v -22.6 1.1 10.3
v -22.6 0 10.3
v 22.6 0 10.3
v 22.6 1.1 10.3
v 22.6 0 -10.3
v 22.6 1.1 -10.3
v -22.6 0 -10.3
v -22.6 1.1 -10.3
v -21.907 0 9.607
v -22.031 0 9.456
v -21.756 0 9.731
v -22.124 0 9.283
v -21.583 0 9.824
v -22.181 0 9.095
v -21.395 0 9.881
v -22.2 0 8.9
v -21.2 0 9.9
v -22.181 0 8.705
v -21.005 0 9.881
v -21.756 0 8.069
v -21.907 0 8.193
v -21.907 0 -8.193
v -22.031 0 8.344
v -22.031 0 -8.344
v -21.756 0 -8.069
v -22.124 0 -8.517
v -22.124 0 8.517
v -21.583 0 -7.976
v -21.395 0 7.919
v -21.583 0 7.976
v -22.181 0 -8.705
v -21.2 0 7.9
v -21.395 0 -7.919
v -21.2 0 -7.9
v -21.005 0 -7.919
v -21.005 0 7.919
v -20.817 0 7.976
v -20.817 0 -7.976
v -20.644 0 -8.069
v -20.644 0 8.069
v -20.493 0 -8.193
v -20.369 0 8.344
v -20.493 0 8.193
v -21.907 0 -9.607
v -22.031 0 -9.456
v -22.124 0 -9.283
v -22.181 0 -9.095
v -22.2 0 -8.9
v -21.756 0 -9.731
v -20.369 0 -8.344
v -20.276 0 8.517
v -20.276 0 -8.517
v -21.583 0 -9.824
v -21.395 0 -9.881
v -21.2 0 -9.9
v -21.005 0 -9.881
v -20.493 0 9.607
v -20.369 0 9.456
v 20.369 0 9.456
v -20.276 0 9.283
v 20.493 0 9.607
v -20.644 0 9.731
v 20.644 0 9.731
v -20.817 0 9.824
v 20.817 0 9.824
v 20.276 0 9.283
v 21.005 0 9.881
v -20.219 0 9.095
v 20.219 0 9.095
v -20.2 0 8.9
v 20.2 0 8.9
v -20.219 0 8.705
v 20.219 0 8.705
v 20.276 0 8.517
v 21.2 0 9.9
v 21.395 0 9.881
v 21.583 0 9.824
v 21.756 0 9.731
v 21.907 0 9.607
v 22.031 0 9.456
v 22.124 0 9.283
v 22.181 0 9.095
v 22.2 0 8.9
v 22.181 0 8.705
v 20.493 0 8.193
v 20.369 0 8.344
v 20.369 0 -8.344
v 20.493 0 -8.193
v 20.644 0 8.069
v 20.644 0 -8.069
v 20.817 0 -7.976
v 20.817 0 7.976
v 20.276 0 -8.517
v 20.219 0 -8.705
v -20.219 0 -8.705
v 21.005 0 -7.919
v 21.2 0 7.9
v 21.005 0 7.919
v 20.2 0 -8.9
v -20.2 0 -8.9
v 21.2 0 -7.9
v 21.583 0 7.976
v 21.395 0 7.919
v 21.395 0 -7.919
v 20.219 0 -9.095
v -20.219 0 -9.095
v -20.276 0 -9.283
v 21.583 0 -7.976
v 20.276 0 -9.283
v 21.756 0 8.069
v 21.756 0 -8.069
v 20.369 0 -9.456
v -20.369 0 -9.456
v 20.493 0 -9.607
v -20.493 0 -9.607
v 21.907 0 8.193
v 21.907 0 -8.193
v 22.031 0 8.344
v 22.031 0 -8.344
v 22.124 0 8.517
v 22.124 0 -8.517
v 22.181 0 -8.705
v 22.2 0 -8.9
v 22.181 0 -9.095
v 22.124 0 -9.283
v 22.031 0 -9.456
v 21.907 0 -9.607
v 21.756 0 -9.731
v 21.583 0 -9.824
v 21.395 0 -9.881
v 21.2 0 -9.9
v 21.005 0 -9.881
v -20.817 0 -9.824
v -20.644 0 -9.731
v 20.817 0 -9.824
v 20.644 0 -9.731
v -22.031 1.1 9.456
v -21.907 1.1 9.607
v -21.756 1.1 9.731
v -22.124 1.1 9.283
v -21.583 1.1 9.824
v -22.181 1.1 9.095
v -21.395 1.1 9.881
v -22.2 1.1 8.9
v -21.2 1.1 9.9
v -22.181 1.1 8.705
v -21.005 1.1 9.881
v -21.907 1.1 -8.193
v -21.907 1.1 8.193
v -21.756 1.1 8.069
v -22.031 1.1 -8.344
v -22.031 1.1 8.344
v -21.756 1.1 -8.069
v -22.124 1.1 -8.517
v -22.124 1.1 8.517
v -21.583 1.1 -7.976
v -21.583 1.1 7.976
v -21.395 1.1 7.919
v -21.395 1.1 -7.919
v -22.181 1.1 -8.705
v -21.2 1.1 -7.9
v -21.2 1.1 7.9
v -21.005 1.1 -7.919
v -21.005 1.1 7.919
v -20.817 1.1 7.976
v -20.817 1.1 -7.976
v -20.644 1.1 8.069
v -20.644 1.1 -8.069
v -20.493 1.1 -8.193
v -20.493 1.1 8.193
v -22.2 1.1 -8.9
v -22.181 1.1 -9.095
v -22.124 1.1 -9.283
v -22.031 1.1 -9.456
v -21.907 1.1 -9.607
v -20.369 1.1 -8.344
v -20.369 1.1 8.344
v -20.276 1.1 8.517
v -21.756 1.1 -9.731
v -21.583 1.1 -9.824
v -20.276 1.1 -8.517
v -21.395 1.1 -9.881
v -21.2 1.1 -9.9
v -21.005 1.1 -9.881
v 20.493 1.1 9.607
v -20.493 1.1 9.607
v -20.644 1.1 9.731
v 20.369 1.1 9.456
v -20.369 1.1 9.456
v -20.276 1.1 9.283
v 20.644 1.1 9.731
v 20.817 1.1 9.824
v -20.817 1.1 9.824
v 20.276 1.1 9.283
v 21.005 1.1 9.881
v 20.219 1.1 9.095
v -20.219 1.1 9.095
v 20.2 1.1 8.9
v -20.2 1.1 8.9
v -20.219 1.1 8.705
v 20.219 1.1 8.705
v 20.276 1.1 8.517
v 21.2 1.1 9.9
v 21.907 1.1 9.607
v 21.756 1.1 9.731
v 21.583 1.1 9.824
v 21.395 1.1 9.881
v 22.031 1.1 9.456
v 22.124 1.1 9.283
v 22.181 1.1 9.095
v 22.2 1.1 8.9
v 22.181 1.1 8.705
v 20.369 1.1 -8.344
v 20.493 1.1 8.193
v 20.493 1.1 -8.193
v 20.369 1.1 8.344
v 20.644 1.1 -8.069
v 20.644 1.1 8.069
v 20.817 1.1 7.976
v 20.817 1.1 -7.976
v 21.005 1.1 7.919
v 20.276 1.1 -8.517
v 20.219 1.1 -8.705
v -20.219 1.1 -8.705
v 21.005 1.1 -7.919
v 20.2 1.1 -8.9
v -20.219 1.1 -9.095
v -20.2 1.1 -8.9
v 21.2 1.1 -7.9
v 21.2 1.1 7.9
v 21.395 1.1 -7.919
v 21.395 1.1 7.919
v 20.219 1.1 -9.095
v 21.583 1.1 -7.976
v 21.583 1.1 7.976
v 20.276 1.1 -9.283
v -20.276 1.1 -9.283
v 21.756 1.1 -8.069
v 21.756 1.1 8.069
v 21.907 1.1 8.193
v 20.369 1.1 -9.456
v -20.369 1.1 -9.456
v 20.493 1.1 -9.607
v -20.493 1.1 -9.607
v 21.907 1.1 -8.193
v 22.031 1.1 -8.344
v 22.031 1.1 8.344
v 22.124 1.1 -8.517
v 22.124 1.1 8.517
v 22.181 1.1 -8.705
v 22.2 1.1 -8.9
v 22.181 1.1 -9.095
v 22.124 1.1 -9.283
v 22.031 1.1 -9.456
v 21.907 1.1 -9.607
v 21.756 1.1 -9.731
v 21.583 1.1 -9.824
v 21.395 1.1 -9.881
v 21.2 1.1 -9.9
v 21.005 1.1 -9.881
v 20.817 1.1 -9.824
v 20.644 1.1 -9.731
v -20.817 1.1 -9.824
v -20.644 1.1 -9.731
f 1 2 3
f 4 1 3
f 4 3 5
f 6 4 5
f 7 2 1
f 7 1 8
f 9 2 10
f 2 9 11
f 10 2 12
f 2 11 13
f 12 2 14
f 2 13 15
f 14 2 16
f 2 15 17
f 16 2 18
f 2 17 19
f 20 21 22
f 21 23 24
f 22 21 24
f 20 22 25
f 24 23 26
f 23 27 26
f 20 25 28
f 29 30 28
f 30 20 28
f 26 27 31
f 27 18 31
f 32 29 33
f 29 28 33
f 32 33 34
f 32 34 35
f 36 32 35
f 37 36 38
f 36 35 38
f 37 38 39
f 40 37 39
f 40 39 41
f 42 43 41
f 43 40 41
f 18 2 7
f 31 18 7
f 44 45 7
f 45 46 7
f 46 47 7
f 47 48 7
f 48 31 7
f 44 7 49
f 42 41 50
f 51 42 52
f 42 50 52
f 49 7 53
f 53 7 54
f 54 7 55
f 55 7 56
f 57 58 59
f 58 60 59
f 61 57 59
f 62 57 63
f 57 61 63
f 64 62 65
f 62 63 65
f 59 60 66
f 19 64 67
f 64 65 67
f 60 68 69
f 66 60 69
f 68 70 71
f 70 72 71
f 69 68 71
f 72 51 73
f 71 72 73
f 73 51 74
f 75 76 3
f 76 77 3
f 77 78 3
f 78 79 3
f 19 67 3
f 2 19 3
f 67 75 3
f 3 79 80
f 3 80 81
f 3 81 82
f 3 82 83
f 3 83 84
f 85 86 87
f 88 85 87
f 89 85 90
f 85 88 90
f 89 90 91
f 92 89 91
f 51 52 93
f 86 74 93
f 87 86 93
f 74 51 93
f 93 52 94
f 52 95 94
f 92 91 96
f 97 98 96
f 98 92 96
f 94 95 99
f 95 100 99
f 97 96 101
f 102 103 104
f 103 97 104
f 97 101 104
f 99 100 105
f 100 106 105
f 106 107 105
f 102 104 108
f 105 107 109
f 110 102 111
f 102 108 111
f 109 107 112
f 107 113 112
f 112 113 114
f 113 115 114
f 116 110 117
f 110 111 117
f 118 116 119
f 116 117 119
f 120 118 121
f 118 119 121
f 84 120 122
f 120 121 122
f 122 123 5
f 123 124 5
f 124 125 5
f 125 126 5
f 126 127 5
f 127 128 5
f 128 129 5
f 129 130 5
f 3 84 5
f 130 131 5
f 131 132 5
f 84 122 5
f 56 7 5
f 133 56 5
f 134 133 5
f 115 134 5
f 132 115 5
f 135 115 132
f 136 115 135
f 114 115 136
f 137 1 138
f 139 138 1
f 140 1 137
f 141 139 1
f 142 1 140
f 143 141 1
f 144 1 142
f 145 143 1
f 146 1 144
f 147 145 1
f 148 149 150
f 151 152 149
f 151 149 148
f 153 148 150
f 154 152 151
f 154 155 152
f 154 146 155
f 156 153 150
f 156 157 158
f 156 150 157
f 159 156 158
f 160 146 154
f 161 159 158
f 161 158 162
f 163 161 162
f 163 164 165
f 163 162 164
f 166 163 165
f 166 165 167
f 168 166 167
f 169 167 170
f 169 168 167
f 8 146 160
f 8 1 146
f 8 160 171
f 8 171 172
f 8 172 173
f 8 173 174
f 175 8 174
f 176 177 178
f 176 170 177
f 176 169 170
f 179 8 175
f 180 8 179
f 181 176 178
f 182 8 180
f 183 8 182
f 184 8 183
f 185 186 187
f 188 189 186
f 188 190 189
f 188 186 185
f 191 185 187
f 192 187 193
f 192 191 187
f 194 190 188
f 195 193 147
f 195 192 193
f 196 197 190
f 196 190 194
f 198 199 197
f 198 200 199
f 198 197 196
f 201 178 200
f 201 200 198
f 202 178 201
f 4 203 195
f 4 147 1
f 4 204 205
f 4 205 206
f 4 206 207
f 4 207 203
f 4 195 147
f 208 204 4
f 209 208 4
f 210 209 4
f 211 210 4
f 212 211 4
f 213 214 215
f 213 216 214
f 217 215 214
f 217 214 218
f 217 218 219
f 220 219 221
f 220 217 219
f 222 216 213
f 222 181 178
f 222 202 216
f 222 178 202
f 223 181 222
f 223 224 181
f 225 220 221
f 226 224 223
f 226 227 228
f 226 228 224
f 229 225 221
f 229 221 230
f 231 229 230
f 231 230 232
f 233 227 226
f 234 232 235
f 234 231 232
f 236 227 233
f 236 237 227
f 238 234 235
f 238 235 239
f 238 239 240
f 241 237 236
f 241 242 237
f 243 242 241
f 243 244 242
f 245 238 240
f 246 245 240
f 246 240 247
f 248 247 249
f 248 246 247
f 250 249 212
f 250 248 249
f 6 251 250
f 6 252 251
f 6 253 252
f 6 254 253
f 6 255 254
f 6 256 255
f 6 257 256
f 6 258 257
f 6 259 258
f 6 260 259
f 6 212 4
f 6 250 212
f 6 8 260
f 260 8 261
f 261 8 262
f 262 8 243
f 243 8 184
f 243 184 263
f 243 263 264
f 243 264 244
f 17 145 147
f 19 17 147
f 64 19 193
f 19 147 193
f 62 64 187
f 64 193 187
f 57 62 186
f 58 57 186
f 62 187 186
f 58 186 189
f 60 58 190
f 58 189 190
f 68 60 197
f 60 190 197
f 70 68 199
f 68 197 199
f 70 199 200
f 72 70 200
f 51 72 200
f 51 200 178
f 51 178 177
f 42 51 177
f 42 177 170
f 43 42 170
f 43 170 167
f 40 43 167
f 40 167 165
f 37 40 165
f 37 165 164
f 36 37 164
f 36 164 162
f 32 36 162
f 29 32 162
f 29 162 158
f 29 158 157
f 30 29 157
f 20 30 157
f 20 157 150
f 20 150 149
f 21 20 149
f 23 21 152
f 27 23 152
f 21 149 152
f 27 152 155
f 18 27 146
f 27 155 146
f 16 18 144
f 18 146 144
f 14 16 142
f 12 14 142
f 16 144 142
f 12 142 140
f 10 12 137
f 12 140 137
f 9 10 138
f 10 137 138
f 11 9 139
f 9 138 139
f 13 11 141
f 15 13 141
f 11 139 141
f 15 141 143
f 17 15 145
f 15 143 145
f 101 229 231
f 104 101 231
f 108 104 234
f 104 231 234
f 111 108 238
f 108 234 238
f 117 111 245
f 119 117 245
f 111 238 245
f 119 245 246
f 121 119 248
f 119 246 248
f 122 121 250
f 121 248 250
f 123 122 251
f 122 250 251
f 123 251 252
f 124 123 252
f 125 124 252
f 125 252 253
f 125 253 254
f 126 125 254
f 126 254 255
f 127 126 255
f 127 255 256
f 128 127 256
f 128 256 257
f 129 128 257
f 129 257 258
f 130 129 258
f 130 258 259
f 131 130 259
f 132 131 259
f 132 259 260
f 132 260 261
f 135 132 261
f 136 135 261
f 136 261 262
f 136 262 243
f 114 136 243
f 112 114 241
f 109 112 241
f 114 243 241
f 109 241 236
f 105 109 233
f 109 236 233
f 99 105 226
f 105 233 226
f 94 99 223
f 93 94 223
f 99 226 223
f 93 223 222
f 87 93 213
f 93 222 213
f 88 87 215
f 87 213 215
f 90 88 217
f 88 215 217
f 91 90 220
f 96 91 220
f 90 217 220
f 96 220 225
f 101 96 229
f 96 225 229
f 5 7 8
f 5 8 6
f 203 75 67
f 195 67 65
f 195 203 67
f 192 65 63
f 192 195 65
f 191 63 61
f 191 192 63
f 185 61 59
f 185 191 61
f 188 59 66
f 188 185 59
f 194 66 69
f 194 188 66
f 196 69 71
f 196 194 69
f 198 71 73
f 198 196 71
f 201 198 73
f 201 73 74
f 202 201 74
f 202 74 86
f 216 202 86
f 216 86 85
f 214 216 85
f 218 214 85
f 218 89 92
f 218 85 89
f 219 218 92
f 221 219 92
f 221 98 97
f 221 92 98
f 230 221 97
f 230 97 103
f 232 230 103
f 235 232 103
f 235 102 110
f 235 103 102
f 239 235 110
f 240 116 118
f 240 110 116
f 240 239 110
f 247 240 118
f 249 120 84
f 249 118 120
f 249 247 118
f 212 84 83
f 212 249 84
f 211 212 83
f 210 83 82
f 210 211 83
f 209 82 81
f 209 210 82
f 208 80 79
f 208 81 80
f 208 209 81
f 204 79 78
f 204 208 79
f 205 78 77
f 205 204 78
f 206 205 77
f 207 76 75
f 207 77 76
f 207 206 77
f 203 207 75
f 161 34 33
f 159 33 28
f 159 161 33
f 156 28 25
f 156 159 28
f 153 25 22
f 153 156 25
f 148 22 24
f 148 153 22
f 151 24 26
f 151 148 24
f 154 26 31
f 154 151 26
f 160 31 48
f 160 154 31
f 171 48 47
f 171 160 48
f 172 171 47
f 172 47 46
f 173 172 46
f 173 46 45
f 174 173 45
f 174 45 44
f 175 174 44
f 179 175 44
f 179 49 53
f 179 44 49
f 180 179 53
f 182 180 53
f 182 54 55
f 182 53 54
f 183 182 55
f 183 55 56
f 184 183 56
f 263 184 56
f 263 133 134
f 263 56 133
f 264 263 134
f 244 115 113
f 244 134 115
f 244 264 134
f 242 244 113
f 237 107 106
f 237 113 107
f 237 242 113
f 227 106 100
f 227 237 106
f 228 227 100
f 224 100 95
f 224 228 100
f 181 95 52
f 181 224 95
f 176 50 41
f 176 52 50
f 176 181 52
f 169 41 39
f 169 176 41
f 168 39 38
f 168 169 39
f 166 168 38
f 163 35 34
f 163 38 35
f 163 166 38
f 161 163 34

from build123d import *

# Parameters (mm, degrees)
SKETCH1_W           = 45.2
SKETCH1_H           = 20.6
BOSS_EXTRUDE1_DEPTH = 1.1
SKETCH18_R          = 1
CUT_EXTRUDE4_DEPTH  = 25.860812537


with BuildPart() as part:
    # Sketch1 → Boss-Extrude1 (new body)
    with BuildSketch(Plane(origin=(0, 0, 0), x_dir=(1, 0, 0), z_dir=(0, 1, 0))):
        Rectangle(SKETCH1_W, SKETCH1_H)
    extrude(amount=BOSS_EXTRUDE1_DEPTH)

    # Sketch18 → Cut-Extrude4 (cut, through all)
    with BuildSketch(Plane(origin=(0, 1.1, 0), x_dir=(1, 0, 0), z_dir=(0, 1, 0))):
        with Locations(Location((-21.2, -8.9, 0), (0, 0, 270))):
            Circle(SKETCH18_R)
        with Locations(Location((21.2, 8.9, 0), (0, 0, 270))):
            Circle(SKETCH18_R)
    cut_extrude4 = extrude(amount=-CUT_EXTRUDE4_DEPTH, mode=Mode.SUBTRACT)

    # Mirror1: Cut-Extrude4 across plane
    add(cut_extrude4.mirror(Plane(origin=(0, 0, 0), x_dir=(0, 0, 1), z_dir=(1, 0, 0))), mode=Mode.SUBTRACT)


solid = part.part
